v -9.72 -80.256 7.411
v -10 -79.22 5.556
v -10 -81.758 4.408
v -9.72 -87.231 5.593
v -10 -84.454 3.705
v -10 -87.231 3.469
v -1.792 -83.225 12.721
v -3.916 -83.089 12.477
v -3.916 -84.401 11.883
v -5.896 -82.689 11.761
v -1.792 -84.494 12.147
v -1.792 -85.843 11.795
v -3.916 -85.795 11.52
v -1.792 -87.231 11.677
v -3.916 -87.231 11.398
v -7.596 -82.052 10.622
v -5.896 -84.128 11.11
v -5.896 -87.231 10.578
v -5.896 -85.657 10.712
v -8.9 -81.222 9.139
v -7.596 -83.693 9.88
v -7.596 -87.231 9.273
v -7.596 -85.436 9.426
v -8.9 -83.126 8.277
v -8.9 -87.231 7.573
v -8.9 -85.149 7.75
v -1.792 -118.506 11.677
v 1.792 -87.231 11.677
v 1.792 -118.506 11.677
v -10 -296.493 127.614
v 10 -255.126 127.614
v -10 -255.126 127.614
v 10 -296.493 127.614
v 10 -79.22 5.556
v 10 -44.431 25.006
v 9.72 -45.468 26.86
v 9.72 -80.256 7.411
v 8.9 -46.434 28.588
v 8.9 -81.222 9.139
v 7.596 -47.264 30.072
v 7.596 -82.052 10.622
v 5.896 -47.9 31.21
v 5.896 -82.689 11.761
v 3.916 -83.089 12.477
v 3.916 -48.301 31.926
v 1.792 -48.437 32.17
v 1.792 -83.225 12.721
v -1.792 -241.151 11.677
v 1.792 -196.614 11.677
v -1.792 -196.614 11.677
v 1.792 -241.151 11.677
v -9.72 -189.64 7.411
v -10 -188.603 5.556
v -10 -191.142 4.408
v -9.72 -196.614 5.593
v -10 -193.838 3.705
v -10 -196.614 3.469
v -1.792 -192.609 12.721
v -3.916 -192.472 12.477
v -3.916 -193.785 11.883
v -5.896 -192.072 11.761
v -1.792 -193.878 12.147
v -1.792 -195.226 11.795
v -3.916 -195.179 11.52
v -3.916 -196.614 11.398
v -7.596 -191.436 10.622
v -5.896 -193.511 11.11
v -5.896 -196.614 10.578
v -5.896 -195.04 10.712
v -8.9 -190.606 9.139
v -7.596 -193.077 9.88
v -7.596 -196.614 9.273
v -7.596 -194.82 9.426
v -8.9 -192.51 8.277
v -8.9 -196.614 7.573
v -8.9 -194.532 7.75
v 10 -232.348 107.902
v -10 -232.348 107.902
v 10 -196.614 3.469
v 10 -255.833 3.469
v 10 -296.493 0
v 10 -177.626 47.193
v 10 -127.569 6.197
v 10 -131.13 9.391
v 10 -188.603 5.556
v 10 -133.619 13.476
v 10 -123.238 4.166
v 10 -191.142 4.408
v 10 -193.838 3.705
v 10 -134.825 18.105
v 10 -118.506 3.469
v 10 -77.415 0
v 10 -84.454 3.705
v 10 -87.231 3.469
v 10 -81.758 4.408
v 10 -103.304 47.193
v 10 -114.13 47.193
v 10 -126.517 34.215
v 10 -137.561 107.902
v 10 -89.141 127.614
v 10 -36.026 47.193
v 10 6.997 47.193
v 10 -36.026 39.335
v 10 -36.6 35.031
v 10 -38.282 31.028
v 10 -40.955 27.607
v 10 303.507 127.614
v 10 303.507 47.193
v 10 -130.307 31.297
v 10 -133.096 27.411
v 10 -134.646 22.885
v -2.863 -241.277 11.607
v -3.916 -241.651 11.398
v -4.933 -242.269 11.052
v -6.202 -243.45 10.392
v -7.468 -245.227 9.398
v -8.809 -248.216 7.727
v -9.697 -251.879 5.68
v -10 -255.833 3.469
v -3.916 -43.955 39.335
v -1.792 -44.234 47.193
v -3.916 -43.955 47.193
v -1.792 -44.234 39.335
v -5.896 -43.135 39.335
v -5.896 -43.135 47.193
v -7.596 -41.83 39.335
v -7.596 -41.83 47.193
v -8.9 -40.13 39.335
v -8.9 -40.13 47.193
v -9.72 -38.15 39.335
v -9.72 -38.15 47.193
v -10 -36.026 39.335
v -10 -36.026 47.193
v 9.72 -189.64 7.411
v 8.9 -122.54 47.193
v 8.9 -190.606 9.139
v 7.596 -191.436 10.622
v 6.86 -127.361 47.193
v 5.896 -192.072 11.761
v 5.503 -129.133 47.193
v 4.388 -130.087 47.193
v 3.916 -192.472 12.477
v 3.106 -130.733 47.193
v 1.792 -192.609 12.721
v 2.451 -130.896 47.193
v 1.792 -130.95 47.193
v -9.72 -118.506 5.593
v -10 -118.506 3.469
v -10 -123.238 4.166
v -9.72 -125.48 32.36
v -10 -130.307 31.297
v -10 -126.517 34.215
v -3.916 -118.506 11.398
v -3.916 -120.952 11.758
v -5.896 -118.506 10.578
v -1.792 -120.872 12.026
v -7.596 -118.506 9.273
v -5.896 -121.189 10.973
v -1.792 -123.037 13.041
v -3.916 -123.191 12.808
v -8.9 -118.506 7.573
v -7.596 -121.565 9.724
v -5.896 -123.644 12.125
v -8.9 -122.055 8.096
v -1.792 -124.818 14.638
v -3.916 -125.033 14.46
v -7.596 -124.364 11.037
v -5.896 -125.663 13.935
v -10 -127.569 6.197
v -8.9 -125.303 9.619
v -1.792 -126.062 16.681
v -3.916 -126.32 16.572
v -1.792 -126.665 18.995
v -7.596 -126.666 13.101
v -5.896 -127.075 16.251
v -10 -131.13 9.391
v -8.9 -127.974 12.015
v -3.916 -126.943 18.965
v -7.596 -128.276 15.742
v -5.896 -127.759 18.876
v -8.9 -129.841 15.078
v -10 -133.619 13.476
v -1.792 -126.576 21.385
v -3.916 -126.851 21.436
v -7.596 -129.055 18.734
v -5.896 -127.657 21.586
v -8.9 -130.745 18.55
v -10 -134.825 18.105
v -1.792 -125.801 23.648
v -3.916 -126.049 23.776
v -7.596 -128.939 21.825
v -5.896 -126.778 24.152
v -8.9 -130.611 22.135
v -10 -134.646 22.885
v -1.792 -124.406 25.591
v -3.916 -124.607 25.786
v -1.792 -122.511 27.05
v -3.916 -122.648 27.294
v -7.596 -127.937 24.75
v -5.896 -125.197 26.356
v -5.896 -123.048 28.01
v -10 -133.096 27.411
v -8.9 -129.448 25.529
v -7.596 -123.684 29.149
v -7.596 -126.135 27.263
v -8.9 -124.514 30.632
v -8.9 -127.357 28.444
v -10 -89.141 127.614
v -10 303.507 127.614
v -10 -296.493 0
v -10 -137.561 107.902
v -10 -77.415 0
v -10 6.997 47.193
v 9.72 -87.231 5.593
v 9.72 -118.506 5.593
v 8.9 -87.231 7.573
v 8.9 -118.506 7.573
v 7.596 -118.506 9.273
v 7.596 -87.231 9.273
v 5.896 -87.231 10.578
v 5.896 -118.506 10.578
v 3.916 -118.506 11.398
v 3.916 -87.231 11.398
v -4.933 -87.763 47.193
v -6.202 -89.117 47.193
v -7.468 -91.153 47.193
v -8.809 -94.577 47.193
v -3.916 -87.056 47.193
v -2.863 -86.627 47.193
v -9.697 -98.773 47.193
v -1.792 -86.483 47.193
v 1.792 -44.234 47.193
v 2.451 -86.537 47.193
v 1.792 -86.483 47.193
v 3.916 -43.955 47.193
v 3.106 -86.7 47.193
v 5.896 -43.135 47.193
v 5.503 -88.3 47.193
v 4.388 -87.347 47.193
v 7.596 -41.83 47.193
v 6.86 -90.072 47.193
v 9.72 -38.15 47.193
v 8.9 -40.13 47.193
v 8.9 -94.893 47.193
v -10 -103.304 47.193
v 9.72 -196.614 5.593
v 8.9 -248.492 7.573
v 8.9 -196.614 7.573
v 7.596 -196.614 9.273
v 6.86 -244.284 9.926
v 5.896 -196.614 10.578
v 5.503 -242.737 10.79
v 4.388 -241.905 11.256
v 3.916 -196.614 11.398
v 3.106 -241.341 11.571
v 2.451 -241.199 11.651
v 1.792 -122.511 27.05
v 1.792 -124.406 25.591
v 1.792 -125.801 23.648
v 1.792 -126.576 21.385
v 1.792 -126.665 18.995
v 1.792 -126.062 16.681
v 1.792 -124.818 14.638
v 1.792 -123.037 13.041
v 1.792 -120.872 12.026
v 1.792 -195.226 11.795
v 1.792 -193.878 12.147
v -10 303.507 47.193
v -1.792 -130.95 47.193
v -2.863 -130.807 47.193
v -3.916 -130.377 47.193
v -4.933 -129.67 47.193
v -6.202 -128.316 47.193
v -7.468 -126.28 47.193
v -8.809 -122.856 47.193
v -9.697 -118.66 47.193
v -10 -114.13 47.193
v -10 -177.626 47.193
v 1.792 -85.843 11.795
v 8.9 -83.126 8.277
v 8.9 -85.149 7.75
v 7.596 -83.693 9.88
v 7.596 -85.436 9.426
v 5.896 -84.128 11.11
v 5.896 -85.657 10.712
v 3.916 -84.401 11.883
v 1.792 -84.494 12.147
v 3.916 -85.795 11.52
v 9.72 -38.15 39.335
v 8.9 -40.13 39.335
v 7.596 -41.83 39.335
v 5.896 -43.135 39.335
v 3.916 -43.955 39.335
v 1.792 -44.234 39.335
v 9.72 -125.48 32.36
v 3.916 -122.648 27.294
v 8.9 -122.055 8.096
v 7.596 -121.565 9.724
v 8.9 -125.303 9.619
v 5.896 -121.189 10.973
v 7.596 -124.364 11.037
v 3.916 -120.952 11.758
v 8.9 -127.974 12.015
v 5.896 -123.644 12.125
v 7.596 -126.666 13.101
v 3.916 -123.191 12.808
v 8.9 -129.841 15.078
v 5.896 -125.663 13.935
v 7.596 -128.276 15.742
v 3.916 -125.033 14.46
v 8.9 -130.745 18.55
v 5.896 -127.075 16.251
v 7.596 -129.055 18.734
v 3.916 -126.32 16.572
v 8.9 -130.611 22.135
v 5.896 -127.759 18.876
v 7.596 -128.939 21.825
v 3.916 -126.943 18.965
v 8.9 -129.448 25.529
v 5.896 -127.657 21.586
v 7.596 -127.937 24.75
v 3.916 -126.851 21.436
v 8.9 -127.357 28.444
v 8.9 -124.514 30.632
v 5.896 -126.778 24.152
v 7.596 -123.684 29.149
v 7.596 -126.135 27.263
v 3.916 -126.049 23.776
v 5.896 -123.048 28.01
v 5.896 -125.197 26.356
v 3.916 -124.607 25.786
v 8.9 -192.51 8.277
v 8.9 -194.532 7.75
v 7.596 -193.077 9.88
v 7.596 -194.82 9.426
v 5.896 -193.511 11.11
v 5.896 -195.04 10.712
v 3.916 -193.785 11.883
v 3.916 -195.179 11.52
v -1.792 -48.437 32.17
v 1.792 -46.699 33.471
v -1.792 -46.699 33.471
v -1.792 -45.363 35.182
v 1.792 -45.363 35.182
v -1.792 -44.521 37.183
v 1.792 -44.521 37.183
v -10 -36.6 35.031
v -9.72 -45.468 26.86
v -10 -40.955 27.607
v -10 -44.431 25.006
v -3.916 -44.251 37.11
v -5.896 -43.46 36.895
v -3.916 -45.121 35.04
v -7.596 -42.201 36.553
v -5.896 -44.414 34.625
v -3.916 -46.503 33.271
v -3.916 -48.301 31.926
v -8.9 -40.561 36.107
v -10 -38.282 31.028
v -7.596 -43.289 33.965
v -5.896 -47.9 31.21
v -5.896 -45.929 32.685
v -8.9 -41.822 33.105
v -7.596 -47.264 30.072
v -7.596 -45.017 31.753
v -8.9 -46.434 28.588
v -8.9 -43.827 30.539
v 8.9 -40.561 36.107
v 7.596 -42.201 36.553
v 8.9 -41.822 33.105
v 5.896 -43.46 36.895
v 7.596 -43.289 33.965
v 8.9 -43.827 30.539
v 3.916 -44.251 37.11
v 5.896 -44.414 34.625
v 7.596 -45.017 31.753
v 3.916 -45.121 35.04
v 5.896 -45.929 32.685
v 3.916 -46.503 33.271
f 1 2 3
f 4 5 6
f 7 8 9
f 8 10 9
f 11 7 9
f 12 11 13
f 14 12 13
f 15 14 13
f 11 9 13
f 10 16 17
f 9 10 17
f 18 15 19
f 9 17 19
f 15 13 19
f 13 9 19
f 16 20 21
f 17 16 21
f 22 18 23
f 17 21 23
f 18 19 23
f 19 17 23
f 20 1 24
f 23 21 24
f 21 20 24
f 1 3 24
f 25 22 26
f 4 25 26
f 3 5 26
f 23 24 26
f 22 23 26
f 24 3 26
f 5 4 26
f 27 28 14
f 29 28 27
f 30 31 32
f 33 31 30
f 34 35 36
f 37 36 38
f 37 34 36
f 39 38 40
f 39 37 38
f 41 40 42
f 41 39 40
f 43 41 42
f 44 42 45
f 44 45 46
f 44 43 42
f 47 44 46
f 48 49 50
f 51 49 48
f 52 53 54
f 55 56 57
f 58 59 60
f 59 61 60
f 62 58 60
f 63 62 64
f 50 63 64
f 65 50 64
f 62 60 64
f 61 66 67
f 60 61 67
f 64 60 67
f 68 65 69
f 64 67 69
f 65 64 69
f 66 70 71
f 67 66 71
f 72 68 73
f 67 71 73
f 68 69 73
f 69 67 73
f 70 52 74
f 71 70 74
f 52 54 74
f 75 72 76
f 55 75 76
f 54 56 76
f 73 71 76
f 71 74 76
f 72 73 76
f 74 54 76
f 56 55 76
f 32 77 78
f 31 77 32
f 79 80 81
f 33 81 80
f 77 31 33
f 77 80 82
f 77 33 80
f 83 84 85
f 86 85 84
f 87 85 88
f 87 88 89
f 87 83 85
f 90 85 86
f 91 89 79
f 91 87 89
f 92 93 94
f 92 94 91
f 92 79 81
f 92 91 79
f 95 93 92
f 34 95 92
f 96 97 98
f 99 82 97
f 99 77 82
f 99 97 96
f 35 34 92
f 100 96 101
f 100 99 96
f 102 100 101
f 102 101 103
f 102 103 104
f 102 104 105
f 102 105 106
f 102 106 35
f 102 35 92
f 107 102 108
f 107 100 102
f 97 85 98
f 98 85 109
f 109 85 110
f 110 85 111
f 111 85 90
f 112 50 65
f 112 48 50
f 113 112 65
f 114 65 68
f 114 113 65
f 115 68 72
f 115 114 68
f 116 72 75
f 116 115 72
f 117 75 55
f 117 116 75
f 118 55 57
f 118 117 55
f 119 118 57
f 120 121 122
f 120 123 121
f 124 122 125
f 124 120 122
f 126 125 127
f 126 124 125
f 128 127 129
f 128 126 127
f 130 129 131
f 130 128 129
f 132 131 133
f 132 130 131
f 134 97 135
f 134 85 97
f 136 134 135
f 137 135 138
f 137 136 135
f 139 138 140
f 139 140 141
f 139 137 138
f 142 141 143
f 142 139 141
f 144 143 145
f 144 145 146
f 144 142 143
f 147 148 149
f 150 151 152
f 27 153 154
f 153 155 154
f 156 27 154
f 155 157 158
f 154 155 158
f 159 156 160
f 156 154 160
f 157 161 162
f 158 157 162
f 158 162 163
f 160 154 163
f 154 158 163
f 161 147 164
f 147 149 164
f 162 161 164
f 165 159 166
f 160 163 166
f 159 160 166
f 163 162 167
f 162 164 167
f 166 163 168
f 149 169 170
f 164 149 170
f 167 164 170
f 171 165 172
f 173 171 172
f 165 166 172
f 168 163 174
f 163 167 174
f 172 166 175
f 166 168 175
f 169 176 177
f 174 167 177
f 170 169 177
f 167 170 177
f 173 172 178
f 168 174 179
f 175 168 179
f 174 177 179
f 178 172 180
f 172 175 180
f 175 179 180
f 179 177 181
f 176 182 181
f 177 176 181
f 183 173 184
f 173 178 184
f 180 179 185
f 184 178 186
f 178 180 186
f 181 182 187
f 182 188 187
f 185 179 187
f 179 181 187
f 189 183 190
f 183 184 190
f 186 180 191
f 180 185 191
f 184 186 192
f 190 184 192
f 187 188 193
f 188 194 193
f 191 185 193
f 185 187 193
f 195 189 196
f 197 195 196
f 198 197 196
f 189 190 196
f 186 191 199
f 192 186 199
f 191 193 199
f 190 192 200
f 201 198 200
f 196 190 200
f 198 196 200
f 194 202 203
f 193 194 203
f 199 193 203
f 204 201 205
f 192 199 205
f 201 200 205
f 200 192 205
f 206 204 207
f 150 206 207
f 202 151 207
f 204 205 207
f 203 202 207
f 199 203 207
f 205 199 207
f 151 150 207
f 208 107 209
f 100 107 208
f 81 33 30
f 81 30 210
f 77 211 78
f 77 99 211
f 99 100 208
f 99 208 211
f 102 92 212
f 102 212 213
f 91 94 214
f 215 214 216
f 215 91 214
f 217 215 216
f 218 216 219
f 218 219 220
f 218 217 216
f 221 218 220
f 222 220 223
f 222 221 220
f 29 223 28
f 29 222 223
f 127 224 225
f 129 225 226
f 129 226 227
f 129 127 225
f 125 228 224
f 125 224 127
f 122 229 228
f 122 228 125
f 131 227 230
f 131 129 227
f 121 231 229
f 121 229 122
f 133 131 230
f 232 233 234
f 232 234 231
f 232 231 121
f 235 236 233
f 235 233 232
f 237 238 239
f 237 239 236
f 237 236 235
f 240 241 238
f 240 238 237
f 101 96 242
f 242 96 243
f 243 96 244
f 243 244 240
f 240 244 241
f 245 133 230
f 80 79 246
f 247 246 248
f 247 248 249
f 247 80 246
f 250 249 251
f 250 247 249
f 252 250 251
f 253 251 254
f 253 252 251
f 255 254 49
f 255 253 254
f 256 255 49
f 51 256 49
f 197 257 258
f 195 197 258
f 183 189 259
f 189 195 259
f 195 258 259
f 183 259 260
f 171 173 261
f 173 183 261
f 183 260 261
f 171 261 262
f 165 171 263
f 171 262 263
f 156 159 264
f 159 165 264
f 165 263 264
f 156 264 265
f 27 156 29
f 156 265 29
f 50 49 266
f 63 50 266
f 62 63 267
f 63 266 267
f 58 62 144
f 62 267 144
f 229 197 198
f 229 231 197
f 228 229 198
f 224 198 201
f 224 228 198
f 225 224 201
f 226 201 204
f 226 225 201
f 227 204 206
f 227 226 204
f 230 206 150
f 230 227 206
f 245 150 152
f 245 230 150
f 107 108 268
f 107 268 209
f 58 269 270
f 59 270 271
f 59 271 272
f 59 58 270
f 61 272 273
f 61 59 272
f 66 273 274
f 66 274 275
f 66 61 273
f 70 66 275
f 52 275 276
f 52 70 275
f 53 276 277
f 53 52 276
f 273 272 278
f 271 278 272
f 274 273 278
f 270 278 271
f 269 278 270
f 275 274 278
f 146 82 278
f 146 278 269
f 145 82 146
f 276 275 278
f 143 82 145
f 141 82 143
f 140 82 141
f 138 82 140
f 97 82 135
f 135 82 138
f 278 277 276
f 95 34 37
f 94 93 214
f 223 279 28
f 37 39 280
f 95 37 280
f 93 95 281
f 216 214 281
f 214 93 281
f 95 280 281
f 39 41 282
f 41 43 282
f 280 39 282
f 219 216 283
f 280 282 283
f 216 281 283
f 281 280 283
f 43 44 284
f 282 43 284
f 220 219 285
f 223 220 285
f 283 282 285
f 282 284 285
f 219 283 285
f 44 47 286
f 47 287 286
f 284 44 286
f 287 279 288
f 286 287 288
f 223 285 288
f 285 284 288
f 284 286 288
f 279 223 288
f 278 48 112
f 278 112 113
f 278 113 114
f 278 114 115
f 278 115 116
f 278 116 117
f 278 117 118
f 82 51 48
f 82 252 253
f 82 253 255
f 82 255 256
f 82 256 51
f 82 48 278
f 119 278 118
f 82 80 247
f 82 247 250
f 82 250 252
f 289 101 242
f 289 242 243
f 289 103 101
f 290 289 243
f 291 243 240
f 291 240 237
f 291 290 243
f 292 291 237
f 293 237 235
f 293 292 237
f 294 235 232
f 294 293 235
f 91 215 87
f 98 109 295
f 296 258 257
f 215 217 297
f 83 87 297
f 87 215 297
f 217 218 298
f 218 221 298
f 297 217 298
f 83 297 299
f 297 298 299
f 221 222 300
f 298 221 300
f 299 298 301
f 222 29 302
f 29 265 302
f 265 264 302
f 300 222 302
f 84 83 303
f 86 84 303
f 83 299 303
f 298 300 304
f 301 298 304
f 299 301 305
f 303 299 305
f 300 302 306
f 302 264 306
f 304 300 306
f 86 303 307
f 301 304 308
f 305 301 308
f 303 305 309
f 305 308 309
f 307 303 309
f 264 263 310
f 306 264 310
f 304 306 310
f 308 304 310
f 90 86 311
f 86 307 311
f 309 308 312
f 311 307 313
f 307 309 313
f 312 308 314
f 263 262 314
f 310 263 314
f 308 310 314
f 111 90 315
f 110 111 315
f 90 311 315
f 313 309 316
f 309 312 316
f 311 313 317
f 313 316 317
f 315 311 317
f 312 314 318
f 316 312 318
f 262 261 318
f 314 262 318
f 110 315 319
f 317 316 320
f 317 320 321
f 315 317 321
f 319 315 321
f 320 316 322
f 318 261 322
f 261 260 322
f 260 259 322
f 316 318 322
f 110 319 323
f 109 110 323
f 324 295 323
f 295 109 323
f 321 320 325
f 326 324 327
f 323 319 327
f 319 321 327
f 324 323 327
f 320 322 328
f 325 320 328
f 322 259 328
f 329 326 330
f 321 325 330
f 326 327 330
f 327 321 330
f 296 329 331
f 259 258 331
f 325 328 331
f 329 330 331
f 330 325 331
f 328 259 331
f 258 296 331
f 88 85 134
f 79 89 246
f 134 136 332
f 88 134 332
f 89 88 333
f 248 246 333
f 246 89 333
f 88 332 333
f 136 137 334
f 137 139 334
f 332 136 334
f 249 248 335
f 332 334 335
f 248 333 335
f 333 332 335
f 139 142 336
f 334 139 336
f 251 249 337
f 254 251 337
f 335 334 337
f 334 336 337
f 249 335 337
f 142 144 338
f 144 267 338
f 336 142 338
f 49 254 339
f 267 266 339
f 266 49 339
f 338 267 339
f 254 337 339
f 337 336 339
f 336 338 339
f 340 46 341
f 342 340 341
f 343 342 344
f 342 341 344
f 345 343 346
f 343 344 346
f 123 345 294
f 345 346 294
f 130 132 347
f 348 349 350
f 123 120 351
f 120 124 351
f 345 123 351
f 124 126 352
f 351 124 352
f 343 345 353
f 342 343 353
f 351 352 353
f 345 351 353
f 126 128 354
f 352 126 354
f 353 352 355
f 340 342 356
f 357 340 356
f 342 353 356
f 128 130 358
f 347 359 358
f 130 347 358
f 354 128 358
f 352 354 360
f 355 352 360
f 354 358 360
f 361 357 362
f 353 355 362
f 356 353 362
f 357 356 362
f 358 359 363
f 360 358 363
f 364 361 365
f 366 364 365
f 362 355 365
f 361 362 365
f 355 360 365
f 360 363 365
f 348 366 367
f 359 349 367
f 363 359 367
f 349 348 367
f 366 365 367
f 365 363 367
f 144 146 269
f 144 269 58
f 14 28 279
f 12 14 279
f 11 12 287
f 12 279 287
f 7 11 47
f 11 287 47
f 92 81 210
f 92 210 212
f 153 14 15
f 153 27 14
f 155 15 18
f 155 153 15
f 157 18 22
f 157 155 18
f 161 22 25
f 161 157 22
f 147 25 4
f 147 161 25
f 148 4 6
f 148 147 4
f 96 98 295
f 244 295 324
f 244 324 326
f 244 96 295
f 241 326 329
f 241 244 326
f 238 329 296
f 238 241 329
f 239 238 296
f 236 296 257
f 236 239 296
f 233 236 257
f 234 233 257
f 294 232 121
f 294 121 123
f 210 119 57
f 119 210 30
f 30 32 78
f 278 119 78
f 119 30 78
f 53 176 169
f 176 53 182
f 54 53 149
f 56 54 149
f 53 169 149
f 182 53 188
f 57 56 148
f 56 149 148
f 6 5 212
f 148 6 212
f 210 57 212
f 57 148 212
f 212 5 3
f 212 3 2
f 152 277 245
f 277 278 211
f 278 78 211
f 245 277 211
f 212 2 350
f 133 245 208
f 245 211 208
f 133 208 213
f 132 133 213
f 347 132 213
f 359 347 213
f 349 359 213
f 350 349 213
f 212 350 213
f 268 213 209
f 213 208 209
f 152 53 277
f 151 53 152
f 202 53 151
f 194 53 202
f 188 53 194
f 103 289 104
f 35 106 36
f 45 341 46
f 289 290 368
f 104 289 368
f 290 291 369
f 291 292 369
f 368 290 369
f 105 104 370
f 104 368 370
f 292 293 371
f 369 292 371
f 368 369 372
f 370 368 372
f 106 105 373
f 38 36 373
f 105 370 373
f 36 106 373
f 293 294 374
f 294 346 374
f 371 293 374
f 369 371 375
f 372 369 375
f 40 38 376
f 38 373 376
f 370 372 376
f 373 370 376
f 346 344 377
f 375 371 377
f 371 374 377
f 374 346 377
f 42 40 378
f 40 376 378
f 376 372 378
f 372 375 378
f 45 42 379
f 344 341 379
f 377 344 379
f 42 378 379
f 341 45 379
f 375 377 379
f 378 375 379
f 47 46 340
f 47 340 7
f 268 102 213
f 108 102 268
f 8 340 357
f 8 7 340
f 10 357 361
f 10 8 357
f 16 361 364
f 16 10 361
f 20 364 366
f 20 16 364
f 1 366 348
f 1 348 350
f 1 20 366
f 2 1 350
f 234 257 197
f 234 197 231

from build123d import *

# Parameters (mm, degrees)
F1_DEPTH = 10
F2_F1_R  = 8.2083261121
F2_F2_R  = 8.2083261121


with BuildPart() as f1:
    # F0 (on Right) → F1 (new body, symmetric)
    with BuildSketch(Plane.YZ):
        Polygon((-255.1260930291, 127.6137977839), (-296.4929085316, 127.6137977839), (-296.4929085316, 0), (-262.0377242565, 0), (-241.1511396352, 11.6772135656), (-177.6259690523, 47.1926890314), (-130.9504058889, 47.1926890314), (-86.4829342095, 47.1926890314), (-44.2343052483, 47.1926890314), (6.9967018189, 47.1926890314), (303.5070914684, 47.1926890314), (303.5070914684, 127.6137977839), (-89.1410559416, 127.6137977839), (-137.561365962, 107.9020351171), (-232.3477119207, 107.9020351171), align=None)
        Polygon((-241.1511396352, 11.6772135656), (-262.0377242565, 0), (-77.4150533853, 0), (6.9967018189, 47.1926890314), (-44.2343052483, 47.1926890314), (-44.2343052483, 34.5198116153), (-85.0919854182, 11.6772135656), (-150.0081047923, 11.6772135656), (-194.4755764717, 11.6772135656), align=None)
        Polygon((-130.9504058889, 47.1926890314), (-194.4755764717, 11.6772135656), (-150.0081047923, 11.6772135656), (-86.4829342095, 47.1926890314), align=None)
    extrude(amount=F1_DEPTH, both=True)

    # F2: fillet of radius 8.2083261121 on 12 edges, made by hand

    # F2_f1
    f2_f1_edges = [f1.edges().sort_by_distance(p)[0] for p in [
        (0, -150.0081047923, 11.6772135656),
        (0, -194.4755764717, 11.6772135656),
        (0, -85.0919854182, 11.6772135656),
        (0, -44.2343052483, 34.5198116153),
    ]]
    fillet(f2_f1_edges, radius=F2_F1_R)

    # F2_f2
    f2_f2_edges = [f1.edges().sort_by_distance(p)[0] for p in [
        (10, -161.7795821345, 29.9567990284),
        (-10, -161.7795821345, 29.9567990284),
        (-10, -104.4970100413, 37.1214296806),
        (10, -104.4970100413, 37.1214296806),
        (10, -126.4486219722, 17.8158787517),
        (-10, -126.4486219722, 17.8158787517),
        (-10, -194.5446792073, 11.9424218254),
        (10, -194.5446792073, 11.9424218254),
    ]]
    fillet(f2_f2_edges, radius=F2_F2_R)


solid = f1.part
